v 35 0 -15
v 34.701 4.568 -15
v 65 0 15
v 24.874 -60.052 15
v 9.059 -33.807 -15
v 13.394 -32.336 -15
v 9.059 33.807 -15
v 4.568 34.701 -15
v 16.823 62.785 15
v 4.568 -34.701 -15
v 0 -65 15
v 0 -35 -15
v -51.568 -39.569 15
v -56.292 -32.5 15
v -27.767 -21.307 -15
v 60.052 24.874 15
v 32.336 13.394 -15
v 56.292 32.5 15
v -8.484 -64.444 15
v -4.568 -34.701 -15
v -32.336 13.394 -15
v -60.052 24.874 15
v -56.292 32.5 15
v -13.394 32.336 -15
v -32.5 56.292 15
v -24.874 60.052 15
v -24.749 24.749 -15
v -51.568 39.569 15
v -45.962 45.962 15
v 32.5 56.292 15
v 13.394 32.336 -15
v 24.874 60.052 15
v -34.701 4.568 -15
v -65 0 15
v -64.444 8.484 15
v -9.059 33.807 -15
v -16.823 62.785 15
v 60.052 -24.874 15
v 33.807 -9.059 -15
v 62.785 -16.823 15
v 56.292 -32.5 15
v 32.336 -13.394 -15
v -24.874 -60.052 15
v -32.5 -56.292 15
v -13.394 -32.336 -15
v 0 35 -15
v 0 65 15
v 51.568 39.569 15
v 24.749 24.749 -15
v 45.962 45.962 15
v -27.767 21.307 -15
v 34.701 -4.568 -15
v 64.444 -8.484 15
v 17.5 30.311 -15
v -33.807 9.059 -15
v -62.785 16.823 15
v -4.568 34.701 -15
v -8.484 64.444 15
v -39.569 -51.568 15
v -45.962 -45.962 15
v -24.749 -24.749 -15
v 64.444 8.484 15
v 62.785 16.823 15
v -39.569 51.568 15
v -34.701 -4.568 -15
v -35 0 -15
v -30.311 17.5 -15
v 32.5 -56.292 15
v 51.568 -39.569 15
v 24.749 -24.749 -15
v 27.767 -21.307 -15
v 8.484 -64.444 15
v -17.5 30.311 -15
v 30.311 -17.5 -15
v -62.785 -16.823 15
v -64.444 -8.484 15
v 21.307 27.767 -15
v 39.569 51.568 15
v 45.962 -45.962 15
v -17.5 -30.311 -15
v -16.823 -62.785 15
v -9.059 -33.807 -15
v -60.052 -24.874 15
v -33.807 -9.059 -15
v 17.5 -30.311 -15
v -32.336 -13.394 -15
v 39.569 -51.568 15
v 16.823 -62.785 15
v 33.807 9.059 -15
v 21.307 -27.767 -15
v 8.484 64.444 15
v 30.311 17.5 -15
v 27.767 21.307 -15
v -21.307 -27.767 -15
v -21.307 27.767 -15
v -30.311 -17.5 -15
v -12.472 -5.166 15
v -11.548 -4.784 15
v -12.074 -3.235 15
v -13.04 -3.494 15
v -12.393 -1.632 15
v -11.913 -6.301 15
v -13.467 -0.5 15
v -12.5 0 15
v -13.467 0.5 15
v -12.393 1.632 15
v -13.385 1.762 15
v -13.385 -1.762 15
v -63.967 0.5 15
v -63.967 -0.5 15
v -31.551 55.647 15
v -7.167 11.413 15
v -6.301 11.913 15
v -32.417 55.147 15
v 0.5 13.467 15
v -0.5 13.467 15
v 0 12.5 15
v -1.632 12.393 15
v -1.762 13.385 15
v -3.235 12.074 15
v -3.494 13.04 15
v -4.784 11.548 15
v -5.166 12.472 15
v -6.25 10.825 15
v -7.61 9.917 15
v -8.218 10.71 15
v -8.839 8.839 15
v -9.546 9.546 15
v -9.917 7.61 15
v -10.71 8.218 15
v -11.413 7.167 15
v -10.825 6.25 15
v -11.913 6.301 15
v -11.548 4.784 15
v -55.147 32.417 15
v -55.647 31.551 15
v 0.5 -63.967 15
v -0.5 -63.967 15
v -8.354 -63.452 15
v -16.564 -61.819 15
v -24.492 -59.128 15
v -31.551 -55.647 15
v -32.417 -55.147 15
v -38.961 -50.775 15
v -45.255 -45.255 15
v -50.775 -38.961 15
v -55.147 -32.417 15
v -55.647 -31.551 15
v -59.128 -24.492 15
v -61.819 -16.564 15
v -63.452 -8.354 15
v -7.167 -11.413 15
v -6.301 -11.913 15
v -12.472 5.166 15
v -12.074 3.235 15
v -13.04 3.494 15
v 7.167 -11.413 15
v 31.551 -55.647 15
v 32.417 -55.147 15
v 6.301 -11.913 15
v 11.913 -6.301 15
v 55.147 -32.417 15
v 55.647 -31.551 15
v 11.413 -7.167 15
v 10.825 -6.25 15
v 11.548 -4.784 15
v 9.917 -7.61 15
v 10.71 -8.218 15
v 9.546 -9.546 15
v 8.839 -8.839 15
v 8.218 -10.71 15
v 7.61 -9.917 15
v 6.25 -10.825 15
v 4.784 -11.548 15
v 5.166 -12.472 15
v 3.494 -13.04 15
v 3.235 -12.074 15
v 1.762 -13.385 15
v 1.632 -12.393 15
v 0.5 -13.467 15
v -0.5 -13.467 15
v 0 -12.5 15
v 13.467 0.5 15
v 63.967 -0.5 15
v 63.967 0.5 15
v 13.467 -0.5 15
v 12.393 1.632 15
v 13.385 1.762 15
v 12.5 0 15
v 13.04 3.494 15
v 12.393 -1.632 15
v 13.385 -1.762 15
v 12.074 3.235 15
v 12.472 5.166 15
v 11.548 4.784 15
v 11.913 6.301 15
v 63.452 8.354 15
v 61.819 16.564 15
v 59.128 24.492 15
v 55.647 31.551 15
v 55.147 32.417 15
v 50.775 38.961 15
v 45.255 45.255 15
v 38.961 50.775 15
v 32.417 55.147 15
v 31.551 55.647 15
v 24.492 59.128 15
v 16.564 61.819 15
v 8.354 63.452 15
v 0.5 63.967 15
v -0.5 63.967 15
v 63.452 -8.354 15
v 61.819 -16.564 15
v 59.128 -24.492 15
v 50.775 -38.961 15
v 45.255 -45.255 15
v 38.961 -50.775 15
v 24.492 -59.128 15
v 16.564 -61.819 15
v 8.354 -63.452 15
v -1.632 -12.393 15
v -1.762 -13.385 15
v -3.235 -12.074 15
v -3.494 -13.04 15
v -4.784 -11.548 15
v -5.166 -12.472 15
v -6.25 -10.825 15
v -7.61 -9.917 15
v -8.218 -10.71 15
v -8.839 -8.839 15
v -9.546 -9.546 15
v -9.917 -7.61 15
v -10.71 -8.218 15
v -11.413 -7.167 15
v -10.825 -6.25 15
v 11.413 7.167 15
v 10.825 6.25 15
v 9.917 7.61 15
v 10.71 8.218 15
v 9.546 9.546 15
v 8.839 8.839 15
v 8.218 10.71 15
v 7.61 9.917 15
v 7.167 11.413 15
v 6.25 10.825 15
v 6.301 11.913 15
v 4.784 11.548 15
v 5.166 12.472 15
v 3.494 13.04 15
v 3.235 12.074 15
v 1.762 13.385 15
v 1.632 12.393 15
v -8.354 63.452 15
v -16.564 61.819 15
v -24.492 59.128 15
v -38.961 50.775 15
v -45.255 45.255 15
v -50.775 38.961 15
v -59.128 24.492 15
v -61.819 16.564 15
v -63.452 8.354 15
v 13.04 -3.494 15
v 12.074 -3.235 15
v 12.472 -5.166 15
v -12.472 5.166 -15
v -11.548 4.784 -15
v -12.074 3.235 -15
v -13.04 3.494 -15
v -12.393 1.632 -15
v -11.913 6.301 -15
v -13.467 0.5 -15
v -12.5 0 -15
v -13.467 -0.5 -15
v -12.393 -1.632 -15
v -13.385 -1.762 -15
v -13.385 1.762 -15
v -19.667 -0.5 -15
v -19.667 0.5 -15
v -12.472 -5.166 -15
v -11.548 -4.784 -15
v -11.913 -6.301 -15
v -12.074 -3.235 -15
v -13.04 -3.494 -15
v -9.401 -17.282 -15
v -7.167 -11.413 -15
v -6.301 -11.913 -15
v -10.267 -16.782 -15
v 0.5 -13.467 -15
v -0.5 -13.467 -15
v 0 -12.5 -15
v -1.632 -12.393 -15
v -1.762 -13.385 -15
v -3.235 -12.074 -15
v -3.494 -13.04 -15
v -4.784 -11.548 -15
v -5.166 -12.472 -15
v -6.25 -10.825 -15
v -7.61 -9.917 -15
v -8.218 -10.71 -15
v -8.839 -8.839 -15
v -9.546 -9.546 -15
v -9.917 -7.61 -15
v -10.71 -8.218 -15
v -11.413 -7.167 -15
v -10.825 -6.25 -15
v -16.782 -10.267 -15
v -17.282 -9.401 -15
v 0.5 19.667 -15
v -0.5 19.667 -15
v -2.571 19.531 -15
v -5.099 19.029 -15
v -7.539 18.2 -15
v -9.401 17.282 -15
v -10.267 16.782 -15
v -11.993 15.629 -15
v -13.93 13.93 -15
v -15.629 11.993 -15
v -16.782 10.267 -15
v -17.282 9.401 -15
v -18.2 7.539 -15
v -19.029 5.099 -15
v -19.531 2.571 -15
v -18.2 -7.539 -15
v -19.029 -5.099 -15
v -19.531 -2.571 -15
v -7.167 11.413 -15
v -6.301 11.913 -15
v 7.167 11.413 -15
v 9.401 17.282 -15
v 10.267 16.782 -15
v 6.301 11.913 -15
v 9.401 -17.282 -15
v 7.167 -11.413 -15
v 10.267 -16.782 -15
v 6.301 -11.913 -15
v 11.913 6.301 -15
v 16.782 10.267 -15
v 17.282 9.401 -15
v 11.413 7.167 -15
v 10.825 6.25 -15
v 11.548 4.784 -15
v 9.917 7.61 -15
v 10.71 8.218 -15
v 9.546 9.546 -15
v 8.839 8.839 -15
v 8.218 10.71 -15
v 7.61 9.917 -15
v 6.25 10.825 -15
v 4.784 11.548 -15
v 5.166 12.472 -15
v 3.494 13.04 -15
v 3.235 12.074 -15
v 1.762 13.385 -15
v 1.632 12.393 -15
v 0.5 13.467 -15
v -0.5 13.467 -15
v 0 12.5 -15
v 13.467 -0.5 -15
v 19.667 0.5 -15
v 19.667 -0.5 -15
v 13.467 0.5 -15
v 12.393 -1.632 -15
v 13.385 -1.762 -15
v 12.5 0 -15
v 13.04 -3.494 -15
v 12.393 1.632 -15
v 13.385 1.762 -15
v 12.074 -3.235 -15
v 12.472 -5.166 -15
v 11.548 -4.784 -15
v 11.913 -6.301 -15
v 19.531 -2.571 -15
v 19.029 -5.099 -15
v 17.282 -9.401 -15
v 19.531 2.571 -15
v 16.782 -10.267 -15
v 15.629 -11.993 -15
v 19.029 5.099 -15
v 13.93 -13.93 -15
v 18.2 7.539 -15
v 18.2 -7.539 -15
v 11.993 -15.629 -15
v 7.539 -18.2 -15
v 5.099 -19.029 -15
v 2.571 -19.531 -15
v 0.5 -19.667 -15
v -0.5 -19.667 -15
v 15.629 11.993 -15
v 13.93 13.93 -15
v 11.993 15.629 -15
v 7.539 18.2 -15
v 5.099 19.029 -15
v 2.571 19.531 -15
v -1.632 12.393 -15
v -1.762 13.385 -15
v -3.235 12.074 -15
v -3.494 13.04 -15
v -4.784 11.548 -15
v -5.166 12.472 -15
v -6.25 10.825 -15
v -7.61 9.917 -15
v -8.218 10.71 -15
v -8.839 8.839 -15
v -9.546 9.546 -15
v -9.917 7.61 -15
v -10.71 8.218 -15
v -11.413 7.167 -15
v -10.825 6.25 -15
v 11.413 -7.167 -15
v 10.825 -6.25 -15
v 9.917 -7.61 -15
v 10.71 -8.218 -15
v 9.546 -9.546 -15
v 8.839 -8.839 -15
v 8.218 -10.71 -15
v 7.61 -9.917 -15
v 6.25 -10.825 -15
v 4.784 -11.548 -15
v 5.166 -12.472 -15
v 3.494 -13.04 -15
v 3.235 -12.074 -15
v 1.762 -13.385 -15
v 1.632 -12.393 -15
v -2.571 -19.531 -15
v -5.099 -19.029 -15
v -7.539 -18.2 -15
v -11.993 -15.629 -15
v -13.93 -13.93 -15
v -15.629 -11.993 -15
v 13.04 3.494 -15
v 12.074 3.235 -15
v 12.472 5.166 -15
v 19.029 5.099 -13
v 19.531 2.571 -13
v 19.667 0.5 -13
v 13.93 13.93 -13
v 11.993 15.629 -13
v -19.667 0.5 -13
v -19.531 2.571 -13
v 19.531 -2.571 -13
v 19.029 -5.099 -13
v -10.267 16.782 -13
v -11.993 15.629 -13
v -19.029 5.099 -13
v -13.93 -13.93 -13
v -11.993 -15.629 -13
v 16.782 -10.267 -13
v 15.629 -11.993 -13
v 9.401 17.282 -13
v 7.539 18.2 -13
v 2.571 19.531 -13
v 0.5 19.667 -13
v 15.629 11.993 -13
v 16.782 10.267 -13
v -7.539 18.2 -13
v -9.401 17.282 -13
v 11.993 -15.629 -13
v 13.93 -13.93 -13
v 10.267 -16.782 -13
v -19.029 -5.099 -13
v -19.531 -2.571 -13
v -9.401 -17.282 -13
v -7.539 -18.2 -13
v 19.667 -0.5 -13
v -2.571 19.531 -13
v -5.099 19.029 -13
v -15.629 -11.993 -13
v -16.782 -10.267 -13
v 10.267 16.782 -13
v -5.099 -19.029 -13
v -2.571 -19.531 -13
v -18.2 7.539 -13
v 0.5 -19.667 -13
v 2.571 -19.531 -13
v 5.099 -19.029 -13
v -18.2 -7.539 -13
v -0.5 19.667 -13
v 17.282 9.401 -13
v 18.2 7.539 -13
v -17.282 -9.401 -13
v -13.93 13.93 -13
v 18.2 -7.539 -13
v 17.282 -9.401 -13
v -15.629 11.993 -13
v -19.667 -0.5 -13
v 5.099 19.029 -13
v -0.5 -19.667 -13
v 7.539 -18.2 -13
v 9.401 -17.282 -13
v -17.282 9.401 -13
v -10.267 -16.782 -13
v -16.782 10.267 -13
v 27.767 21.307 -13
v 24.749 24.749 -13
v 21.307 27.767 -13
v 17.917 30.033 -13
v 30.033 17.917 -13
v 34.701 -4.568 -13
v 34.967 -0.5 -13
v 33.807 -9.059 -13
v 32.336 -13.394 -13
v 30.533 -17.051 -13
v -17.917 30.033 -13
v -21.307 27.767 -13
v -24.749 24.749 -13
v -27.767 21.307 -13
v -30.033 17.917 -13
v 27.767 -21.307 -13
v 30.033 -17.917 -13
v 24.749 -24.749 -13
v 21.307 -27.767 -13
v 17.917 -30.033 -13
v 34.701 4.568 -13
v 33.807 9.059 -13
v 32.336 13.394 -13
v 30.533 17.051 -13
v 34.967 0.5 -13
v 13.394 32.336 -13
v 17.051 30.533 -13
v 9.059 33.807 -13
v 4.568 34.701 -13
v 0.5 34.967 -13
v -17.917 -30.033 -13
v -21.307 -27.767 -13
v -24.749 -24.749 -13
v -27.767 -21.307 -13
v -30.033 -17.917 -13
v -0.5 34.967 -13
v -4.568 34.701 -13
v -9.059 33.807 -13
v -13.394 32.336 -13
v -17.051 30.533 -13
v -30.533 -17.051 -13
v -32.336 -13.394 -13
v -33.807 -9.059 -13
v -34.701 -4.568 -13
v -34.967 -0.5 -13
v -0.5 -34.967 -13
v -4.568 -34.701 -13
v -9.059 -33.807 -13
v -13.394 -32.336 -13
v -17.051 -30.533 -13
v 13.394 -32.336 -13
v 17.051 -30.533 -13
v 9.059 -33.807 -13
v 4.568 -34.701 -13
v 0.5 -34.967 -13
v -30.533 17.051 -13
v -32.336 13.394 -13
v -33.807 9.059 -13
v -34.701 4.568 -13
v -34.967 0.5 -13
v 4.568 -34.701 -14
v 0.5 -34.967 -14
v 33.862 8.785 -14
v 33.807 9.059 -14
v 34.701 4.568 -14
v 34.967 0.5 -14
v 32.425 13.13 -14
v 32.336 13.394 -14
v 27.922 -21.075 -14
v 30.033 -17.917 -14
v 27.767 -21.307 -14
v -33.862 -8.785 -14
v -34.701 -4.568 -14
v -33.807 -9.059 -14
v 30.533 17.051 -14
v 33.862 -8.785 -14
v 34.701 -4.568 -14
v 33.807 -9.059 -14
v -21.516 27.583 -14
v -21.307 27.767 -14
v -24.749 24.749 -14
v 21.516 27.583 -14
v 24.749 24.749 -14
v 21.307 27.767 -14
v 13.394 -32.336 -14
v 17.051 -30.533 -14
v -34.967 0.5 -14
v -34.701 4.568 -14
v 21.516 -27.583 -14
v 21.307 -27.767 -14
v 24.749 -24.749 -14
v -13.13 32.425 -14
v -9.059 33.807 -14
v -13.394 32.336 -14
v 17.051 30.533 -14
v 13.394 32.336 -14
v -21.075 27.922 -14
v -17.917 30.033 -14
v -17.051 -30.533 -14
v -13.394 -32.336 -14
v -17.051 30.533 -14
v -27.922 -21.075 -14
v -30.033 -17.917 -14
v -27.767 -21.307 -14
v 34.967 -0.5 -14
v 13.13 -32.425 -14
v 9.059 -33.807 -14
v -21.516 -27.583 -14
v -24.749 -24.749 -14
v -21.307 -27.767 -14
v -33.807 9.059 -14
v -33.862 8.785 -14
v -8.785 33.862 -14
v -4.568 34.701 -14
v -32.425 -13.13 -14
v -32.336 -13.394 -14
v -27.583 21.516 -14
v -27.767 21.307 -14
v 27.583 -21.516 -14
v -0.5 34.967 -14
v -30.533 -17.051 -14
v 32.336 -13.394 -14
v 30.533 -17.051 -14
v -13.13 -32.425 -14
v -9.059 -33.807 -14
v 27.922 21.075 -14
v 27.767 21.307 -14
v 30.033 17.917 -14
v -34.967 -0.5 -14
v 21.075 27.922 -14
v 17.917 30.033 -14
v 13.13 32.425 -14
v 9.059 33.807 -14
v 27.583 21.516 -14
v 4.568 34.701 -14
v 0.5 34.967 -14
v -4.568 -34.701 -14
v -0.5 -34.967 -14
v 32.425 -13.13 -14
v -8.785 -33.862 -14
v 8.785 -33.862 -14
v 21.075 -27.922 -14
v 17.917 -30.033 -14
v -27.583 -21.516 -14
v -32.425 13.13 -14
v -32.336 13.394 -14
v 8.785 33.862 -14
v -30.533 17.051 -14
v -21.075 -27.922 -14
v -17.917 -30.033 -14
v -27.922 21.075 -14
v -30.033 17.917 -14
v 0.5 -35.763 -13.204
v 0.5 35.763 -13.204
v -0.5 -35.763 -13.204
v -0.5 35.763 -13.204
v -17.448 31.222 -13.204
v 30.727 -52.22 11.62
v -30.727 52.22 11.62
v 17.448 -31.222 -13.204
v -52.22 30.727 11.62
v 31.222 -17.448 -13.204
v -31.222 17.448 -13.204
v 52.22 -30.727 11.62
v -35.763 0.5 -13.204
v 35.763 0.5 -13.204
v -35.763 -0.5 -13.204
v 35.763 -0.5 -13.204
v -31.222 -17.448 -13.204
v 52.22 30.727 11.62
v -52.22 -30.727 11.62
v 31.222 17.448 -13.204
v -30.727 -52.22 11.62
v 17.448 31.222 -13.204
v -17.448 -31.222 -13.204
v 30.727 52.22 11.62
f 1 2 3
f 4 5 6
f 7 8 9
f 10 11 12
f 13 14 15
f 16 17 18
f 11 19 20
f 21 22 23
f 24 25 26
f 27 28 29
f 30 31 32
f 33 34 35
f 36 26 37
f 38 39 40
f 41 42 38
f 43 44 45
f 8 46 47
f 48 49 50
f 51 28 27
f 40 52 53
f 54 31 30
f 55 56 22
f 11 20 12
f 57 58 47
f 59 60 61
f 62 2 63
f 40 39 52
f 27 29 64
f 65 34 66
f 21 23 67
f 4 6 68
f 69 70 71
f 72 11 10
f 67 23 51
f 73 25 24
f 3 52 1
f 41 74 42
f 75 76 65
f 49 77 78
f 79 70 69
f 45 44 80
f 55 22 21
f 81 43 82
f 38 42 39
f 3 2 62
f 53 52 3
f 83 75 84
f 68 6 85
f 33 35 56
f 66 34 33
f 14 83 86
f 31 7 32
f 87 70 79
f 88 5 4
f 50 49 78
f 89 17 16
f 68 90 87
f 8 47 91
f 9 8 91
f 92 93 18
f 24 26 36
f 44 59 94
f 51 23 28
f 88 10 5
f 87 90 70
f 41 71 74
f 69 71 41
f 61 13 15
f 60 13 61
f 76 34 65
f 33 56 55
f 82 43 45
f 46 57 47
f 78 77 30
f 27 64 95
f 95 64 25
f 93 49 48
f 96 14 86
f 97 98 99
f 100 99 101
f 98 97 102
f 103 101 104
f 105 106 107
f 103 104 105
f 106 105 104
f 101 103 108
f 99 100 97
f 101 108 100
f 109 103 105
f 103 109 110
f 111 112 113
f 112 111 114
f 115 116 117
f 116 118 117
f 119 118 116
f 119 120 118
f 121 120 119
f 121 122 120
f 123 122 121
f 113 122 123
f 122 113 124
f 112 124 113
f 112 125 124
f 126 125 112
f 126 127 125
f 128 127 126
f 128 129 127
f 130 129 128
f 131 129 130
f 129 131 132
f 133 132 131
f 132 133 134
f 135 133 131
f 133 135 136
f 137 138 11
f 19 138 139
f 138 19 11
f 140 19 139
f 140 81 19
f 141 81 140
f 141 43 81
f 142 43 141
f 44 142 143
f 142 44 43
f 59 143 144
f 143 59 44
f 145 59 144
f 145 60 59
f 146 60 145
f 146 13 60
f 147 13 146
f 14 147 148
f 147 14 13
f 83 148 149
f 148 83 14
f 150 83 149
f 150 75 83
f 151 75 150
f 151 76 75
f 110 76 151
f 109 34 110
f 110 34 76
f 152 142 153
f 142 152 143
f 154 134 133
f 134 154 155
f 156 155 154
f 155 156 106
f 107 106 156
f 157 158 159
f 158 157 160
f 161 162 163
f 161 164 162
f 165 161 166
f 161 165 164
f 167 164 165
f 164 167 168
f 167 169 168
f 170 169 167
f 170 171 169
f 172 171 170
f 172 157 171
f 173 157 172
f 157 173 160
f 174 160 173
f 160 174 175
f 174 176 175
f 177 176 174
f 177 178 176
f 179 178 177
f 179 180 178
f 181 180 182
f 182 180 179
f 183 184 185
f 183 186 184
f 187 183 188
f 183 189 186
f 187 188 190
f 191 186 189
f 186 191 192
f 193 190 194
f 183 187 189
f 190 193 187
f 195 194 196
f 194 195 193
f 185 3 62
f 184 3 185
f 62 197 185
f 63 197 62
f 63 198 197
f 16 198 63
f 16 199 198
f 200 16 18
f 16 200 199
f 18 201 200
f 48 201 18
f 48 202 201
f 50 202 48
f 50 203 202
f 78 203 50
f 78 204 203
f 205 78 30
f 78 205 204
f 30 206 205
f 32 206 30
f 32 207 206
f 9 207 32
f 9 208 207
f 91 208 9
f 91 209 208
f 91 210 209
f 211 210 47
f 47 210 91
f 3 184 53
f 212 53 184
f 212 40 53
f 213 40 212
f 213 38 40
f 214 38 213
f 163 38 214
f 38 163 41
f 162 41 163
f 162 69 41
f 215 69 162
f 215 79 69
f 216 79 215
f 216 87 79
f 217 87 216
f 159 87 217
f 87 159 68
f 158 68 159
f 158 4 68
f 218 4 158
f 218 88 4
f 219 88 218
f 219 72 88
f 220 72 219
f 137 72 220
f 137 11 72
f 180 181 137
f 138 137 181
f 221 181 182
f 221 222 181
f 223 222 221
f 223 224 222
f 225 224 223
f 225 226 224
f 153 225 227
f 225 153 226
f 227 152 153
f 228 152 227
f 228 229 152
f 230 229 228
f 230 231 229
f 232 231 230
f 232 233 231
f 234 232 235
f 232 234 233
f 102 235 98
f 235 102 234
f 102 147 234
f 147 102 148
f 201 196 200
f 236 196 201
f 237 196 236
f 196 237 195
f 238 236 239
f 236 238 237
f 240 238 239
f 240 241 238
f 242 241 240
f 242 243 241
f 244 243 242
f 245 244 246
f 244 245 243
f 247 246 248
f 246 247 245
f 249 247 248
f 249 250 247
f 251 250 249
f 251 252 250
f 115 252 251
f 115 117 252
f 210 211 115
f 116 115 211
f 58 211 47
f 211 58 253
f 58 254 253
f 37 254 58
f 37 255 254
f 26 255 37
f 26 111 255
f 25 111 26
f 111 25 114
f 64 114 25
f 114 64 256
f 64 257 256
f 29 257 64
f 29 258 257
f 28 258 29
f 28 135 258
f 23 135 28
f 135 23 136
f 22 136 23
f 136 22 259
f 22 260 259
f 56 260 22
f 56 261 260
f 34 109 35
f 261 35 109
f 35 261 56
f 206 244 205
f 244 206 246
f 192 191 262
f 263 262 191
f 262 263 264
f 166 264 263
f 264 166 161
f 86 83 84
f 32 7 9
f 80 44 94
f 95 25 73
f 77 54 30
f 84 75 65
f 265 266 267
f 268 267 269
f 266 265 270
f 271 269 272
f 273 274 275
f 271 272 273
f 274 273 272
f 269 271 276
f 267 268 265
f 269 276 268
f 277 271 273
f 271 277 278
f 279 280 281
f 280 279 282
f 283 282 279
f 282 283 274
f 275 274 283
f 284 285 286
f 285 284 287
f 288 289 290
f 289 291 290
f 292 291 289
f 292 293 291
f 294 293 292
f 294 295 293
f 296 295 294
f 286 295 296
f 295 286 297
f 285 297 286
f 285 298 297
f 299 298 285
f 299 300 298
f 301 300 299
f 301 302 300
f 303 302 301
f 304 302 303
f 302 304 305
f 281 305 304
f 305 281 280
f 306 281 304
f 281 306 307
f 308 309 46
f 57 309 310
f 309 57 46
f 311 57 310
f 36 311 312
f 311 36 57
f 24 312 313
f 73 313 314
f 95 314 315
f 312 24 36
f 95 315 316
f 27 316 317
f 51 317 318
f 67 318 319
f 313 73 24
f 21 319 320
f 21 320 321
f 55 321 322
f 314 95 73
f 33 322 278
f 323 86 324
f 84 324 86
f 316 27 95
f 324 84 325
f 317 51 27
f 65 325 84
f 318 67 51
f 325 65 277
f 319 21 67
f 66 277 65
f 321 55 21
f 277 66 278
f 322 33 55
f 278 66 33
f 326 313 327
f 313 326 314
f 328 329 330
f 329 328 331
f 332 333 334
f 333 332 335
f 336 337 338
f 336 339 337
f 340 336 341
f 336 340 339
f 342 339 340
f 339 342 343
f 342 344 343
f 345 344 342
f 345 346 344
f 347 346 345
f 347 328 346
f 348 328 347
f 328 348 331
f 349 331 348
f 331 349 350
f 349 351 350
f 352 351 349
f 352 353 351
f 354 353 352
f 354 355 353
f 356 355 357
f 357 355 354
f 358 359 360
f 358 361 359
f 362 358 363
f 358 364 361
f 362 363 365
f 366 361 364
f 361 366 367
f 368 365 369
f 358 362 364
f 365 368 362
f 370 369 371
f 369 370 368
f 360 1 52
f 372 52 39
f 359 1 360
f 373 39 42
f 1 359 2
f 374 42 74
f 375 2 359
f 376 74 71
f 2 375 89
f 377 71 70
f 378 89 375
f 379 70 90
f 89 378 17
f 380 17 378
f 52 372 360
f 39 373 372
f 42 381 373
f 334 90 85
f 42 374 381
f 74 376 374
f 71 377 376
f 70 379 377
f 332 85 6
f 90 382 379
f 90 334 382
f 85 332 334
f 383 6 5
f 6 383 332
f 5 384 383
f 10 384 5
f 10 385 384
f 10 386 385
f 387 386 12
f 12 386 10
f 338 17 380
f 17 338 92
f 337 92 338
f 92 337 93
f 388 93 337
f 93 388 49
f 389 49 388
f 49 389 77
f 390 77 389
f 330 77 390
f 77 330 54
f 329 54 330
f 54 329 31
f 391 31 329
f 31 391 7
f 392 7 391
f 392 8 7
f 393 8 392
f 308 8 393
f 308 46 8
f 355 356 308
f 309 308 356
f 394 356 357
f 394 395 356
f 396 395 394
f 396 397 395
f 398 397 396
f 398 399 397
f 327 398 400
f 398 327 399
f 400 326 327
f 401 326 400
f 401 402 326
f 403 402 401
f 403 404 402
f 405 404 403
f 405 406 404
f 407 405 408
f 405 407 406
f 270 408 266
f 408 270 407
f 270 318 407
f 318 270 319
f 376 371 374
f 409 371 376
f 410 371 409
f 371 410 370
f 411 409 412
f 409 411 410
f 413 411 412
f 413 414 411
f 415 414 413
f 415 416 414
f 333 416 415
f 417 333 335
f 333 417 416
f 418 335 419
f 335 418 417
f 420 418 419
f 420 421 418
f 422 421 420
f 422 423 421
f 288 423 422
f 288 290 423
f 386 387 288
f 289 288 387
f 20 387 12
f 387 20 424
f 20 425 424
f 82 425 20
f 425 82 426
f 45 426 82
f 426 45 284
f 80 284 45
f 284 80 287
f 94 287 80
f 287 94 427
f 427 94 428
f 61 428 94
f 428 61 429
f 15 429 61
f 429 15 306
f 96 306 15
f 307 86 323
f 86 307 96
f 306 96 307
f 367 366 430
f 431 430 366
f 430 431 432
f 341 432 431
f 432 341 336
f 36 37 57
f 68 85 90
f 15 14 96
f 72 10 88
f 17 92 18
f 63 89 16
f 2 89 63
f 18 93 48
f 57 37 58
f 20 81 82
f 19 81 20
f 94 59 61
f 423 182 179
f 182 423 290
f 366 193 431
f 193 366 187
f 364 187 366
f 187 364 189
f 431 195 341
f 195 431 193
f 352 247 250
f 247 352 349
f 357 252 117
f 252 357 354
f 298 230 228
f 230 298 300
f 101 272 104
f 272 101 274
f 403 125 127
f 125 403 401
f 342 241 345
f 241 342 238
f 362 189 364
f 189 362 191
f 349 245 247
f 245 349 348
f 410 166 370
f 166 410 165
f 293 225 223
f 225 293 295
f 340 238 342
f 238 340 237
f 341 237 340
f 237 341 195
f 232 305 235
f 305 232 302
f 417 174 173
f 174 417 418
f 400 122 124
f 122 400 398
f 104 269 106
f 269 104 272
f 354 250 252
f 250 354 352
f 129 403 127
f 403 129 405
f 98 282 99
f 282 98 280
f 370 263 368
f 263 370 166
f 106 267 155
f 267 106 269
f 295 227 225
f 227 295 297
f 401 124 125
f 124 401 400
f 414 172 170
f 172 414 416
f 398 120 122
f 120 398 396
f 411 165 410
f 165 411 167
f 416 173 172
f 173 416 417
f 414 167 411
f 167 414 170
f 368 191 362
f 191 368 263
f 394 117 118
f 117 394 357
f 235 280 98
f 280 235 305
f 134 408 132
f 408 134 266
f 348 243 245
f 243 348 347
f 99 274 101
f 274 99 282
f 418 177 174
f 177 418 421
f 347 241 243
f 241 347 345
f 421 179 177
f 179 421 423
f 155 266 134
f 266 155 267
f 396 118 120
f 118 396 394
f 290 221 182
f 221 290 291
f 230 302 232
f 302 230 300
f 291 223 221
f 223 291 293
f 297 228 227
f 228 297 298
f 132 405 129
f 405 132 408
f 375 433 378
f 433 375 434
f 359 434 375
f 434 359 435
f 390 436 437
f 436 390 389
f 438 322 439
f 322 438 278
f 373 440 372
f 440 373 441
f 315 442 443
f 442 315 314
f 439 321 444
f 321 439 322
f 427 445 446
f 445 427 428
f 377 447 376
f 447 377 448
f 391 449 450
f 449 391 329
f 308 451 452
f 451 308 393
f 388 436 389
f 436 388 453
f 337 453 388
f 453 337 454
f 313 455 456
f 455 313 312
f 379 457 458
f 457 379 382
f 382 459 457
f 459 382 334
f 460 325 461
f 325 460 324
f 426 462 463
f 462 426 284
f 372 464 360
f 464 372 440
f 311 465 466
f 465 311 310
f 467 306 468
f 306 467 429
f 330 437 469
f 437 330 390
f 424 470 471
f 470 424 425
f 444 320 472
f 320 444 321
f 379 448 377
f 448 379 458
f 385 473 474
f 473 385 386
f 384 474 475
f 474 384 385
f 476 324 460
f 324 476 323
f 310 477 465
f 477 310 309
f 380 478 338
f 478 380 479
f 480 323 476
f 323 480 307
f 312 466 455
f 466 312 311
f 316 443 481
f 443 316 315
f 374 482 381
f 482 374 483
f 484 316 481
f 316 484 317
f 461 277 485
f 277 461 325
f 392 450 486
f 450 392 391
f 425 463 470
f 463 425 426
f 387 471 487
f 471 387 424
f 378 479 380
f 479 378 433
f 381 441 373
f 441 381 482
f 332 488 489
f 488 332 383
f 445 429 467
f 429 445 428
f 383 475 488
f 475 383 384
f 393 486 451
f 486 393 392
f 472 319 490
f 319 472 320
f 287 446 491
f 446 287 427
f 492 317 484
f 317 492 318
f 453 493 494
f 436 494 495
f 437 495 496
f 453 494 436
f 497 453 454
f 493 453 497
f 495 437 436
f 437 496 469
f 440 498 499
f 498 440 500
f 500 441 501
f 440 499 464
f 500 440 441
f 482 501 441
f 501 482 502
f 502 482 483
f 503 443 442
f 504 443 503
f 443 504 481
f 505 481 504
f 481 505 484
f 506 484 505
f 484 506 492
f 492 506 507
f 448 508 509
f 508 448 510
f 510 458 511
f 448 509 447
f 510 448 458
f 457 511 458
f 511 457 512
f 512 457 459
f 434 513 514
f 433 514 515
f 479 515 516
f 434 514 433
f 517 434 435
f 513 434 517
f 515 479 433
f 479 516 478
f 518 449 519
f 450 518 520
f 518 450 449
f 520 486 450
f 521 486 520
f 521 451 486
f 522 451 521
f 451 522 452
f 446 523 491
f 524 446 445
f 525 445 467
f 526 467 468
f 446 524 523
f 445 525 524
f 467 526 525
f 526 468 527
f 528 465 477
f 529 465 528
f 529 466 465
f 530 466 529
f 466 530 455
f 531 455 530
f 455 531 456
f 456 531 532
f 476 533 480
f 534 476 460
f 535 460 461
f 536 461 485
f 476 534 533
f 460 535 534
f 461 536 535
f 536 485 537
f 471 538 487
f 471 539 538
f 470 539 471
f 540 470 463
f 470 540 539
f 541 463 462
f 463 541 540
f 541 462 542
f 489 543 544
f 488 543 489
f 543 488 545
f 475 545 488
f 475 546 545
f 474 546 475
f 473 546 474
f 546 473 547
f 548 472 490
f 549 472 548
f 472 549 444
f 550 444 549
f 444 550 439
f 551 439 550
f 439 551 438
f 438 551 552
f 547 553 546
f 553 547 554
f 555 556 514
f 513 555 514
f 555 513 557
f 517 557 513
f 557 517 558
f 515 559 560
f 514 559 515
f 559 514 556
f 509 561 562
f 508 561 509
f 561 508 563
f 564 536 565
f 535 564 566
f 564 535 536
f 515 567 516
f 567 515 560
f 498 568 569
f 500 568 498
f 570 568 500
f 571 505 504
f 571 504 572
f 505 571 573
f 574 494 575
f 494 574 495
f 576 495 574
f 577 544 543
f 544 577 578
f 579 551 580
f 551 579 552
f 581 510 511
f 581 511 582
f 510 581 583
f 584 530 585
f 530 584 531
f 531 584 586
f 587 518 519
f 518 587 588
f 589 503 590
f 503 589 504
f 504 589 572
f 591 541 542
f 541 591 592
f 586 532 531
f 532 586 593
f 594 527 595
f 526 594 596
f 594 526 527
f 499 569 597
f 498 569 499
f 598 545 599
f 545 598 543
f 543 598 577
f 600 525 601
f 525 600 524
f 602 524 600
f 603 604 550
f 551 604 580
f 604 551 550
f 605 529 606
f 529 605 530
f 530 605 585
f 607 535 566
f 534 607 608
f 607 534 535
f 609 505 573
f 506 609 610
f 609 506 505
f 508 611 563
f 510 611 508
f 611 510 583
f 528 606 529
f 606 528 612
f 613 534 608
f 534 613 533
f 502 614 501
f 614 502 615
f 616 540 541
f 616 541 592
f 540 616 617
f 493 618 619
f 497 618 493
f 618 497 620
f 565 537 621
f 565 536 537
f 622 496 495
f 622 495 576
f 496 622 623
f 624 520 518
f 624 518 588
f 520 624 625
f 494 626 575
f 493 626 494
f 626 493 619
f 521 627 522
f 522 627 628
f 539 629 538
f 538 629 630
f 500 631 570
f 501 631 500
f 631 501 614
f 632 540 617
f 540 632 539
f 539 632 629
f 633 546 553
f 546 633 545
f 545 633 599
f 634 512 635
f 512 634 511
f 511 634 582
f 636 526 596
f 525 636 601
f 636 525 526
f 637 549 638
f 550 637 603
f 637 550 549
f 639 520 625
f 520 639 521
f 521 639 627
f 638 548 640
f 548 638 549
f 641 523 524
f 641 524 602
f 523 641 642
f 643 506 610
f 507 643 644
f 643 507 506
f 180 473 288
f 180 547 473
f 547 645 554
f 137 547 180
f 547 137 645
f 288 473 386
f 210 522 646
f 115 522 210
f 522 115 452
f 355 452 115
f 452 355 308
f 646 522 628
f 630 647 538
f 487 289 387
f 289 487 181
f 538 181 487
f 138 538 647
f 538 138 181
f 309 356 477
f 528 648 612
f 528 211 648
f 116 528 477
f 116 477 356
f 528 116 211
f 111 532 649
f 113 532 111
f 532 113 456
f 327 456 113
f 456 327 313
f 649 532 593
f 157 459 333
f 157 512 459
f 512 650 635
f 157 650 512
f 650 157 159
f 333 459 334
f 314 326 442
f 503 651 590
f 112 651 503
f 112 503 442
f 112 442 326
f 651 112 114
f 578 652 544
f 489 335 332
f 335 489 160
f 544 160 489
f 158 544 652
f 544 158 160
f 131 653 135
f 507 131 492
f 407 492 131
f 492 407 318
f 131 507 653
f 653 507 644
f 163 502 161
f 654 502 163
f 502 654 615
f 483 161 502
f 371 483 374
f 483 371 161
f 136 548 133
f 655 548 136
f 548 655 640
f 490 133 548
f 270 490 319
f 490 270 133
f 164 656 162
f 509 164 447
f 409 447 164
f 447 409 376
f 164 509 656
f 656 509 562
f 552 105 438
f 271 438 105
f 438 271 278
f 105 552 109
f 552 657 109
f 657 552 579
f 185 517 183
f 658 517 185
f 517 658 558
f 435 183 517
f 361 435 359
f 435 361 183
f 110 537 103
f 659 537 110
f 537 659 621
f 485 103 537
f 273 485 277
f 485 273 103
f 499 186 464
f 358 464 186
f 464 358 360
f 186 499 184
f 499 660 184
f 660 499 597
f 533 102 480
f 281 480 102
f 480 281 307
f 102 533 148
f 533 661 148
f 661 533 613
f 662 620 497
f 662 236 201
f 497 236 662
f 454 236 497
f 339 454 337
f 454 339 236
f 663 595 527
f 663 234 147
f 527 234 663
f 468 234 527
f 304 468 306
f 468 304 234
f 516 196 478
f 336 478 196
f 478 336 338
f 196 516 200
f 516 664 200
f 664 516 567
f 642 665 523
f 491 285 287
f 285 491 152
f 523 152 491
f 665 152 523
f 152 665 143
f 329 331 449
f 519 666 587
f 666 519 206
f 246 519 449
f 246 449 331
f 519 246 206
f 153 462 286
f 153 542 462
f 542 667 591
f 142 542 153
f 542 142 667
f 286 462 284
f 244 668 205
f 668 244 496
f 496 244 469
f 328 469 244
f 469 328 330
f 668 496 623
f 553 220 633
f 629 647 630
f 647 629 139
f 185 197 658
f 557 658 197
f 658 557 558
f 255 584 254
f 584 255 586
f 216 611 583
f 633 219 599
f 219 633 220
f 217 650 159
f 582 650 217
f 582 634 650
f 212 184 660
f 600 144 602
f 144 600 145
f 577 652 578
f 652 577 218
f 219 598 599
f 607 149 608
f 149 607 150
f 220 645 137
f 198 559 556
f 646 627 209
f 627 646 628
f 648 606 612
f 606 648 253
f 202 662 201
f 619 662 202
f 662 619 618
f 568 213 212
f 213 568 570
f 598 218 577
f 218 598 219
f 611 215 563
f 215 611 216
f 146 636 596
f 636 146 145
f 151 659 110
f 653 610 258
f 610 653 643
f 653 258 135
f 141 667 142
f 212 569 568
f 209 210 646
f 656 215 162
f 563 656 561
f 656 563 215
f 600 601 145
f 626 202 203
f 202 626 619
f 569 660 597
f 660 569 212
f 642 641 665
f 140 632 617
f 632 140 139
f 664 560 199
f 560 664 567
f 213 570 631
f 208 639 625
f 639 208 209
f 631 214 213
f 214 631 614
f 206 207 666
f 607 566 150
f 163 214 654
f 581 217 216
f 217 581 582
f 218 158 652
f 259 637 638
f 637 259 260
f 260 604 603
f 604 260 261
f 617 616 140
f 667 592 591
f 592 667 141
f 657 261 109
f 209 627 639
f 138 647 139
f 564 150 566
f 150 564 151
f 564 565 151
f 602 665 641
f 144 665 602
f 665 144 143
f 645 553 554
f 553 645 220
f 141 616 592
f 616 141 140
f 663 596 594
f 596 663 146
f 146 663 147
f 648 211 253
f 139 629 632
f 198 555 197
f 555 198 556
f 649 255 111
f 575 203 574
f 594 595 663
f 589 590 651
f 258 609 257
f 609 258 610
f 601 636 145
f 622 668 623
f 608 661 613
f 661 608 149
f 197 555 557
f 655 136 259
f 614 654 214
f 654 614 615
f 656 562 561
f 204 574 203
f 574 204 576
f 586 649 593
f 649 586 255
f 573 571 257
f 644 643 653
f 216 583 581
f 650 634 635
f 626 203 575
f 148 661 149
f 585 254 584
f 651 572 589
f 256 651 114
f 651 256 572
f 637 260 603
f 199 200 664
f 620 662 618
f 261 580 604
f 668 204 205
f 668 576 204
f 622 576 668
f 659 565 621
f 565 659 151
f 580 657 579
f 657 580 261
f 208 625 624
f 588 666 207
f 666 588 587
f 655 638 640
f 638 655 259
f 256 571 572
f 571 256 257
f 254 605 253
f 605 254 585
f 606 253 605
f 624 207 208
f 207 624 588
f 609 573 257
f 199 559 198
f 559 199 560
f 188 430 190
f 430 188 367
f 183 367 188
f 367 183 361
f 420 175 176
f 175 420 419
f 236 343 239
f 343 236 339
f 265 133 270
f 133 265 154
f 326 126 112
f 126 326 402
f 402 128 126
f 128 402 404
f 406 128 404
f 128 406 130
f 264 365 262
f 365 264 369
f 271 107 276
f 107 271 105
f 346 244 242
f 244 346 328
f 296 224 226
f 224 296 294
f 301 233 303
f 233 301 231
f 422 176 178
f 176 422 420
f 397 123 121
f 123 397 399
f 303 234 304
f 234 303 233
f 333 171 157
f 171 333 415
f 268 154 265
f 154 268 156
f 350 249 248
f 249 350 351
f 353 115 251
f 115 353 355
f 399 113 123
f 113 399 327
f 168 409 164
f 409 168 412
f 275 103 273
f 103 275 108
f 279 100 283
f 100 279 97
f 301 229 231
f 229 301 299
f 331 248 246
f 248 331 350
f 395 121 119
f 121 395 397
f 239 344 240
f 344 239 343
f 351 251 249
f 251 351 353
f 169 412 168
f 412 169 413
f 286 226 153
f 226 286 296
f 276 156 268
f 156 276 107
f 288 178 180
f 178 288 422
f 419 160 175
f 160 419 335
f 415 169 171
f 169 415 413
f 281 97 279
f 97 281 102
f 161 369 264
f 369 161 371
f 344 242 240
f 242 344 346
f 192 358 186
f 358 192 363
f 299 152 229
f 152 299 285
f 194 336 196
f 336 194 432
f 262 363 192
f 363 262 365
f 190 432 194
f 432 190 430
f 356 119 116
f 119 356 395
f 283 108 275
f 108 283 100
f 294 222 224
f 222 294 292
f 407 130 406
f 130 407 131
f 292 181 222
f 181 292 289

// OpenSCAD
//wall thickness (e.g. stability, max printer res)
thickness = 2;
top_diameter = 130;
height = 30;

led_inner_dia = 27;
led_outer_dia = 38.4;



case(230,led_inner_dia) {
    case_bottom() {
        led_ring(outer=led_outer_dia,inner=led_inner_dia,num=24);
    }
    clock(segments=12);
}




// ------------- PROGRAM
//Calculate minimum bottom diameter on purpose max 45 deg 
bottom_diameter = top_diameter - height*2;

module case(outer_diameter,inner_diameter) {
    $fn=48;
    difference() {
        /* Create case_outline and stamp out inner hole for microcontroller etc */
        difference() {
            cylinder(h=height, d1=bottom_diameter, d2=top_diameter, center=true);
            cylinder(h=height, d=inner_diameter-thickness, center=true);
        }
        difference() {
            /* create case inline and substract as negative */
            cylinder(h=height, d1=bottom_diameter-thickness, d2=top_diameter-thickness, center=true);            
            /* inner ring */
            cylinder(h=height, d=inner_diameter, center=true);
            /* add child content  */
            children();
        }
    }

}

module case_bottom() { 
    translate([0,0,-height/2+thickness/2]){
        difference() {
            cylinder(h=thickness,d=bottom_diameter,center=true);
            children();
        }
    }
}


module led_ring(outer,inner,h=3,manufacturer_tolerance = 1) {
        difference() {
                cylinder(h=thickness,d=outer+manufacturer_tolerance,center=true);
                cylinder(h=thickness,d=inner-manufacturer_tolerance,center=true);
        }
}

module clock(segments, outer_cut=top_diameter,inner_cut=0) {
    module divider() {
        difference() {
            cube([thickness/2,outer_cut,height], center=true);
            cube([thickness/2,inner_cut,height], center=true);
        }
    }
    angle = 360/segments;
    for (i = [0:angle:179]) {
        rotate(i,0,0) {
            divider();
        }
    }
}
